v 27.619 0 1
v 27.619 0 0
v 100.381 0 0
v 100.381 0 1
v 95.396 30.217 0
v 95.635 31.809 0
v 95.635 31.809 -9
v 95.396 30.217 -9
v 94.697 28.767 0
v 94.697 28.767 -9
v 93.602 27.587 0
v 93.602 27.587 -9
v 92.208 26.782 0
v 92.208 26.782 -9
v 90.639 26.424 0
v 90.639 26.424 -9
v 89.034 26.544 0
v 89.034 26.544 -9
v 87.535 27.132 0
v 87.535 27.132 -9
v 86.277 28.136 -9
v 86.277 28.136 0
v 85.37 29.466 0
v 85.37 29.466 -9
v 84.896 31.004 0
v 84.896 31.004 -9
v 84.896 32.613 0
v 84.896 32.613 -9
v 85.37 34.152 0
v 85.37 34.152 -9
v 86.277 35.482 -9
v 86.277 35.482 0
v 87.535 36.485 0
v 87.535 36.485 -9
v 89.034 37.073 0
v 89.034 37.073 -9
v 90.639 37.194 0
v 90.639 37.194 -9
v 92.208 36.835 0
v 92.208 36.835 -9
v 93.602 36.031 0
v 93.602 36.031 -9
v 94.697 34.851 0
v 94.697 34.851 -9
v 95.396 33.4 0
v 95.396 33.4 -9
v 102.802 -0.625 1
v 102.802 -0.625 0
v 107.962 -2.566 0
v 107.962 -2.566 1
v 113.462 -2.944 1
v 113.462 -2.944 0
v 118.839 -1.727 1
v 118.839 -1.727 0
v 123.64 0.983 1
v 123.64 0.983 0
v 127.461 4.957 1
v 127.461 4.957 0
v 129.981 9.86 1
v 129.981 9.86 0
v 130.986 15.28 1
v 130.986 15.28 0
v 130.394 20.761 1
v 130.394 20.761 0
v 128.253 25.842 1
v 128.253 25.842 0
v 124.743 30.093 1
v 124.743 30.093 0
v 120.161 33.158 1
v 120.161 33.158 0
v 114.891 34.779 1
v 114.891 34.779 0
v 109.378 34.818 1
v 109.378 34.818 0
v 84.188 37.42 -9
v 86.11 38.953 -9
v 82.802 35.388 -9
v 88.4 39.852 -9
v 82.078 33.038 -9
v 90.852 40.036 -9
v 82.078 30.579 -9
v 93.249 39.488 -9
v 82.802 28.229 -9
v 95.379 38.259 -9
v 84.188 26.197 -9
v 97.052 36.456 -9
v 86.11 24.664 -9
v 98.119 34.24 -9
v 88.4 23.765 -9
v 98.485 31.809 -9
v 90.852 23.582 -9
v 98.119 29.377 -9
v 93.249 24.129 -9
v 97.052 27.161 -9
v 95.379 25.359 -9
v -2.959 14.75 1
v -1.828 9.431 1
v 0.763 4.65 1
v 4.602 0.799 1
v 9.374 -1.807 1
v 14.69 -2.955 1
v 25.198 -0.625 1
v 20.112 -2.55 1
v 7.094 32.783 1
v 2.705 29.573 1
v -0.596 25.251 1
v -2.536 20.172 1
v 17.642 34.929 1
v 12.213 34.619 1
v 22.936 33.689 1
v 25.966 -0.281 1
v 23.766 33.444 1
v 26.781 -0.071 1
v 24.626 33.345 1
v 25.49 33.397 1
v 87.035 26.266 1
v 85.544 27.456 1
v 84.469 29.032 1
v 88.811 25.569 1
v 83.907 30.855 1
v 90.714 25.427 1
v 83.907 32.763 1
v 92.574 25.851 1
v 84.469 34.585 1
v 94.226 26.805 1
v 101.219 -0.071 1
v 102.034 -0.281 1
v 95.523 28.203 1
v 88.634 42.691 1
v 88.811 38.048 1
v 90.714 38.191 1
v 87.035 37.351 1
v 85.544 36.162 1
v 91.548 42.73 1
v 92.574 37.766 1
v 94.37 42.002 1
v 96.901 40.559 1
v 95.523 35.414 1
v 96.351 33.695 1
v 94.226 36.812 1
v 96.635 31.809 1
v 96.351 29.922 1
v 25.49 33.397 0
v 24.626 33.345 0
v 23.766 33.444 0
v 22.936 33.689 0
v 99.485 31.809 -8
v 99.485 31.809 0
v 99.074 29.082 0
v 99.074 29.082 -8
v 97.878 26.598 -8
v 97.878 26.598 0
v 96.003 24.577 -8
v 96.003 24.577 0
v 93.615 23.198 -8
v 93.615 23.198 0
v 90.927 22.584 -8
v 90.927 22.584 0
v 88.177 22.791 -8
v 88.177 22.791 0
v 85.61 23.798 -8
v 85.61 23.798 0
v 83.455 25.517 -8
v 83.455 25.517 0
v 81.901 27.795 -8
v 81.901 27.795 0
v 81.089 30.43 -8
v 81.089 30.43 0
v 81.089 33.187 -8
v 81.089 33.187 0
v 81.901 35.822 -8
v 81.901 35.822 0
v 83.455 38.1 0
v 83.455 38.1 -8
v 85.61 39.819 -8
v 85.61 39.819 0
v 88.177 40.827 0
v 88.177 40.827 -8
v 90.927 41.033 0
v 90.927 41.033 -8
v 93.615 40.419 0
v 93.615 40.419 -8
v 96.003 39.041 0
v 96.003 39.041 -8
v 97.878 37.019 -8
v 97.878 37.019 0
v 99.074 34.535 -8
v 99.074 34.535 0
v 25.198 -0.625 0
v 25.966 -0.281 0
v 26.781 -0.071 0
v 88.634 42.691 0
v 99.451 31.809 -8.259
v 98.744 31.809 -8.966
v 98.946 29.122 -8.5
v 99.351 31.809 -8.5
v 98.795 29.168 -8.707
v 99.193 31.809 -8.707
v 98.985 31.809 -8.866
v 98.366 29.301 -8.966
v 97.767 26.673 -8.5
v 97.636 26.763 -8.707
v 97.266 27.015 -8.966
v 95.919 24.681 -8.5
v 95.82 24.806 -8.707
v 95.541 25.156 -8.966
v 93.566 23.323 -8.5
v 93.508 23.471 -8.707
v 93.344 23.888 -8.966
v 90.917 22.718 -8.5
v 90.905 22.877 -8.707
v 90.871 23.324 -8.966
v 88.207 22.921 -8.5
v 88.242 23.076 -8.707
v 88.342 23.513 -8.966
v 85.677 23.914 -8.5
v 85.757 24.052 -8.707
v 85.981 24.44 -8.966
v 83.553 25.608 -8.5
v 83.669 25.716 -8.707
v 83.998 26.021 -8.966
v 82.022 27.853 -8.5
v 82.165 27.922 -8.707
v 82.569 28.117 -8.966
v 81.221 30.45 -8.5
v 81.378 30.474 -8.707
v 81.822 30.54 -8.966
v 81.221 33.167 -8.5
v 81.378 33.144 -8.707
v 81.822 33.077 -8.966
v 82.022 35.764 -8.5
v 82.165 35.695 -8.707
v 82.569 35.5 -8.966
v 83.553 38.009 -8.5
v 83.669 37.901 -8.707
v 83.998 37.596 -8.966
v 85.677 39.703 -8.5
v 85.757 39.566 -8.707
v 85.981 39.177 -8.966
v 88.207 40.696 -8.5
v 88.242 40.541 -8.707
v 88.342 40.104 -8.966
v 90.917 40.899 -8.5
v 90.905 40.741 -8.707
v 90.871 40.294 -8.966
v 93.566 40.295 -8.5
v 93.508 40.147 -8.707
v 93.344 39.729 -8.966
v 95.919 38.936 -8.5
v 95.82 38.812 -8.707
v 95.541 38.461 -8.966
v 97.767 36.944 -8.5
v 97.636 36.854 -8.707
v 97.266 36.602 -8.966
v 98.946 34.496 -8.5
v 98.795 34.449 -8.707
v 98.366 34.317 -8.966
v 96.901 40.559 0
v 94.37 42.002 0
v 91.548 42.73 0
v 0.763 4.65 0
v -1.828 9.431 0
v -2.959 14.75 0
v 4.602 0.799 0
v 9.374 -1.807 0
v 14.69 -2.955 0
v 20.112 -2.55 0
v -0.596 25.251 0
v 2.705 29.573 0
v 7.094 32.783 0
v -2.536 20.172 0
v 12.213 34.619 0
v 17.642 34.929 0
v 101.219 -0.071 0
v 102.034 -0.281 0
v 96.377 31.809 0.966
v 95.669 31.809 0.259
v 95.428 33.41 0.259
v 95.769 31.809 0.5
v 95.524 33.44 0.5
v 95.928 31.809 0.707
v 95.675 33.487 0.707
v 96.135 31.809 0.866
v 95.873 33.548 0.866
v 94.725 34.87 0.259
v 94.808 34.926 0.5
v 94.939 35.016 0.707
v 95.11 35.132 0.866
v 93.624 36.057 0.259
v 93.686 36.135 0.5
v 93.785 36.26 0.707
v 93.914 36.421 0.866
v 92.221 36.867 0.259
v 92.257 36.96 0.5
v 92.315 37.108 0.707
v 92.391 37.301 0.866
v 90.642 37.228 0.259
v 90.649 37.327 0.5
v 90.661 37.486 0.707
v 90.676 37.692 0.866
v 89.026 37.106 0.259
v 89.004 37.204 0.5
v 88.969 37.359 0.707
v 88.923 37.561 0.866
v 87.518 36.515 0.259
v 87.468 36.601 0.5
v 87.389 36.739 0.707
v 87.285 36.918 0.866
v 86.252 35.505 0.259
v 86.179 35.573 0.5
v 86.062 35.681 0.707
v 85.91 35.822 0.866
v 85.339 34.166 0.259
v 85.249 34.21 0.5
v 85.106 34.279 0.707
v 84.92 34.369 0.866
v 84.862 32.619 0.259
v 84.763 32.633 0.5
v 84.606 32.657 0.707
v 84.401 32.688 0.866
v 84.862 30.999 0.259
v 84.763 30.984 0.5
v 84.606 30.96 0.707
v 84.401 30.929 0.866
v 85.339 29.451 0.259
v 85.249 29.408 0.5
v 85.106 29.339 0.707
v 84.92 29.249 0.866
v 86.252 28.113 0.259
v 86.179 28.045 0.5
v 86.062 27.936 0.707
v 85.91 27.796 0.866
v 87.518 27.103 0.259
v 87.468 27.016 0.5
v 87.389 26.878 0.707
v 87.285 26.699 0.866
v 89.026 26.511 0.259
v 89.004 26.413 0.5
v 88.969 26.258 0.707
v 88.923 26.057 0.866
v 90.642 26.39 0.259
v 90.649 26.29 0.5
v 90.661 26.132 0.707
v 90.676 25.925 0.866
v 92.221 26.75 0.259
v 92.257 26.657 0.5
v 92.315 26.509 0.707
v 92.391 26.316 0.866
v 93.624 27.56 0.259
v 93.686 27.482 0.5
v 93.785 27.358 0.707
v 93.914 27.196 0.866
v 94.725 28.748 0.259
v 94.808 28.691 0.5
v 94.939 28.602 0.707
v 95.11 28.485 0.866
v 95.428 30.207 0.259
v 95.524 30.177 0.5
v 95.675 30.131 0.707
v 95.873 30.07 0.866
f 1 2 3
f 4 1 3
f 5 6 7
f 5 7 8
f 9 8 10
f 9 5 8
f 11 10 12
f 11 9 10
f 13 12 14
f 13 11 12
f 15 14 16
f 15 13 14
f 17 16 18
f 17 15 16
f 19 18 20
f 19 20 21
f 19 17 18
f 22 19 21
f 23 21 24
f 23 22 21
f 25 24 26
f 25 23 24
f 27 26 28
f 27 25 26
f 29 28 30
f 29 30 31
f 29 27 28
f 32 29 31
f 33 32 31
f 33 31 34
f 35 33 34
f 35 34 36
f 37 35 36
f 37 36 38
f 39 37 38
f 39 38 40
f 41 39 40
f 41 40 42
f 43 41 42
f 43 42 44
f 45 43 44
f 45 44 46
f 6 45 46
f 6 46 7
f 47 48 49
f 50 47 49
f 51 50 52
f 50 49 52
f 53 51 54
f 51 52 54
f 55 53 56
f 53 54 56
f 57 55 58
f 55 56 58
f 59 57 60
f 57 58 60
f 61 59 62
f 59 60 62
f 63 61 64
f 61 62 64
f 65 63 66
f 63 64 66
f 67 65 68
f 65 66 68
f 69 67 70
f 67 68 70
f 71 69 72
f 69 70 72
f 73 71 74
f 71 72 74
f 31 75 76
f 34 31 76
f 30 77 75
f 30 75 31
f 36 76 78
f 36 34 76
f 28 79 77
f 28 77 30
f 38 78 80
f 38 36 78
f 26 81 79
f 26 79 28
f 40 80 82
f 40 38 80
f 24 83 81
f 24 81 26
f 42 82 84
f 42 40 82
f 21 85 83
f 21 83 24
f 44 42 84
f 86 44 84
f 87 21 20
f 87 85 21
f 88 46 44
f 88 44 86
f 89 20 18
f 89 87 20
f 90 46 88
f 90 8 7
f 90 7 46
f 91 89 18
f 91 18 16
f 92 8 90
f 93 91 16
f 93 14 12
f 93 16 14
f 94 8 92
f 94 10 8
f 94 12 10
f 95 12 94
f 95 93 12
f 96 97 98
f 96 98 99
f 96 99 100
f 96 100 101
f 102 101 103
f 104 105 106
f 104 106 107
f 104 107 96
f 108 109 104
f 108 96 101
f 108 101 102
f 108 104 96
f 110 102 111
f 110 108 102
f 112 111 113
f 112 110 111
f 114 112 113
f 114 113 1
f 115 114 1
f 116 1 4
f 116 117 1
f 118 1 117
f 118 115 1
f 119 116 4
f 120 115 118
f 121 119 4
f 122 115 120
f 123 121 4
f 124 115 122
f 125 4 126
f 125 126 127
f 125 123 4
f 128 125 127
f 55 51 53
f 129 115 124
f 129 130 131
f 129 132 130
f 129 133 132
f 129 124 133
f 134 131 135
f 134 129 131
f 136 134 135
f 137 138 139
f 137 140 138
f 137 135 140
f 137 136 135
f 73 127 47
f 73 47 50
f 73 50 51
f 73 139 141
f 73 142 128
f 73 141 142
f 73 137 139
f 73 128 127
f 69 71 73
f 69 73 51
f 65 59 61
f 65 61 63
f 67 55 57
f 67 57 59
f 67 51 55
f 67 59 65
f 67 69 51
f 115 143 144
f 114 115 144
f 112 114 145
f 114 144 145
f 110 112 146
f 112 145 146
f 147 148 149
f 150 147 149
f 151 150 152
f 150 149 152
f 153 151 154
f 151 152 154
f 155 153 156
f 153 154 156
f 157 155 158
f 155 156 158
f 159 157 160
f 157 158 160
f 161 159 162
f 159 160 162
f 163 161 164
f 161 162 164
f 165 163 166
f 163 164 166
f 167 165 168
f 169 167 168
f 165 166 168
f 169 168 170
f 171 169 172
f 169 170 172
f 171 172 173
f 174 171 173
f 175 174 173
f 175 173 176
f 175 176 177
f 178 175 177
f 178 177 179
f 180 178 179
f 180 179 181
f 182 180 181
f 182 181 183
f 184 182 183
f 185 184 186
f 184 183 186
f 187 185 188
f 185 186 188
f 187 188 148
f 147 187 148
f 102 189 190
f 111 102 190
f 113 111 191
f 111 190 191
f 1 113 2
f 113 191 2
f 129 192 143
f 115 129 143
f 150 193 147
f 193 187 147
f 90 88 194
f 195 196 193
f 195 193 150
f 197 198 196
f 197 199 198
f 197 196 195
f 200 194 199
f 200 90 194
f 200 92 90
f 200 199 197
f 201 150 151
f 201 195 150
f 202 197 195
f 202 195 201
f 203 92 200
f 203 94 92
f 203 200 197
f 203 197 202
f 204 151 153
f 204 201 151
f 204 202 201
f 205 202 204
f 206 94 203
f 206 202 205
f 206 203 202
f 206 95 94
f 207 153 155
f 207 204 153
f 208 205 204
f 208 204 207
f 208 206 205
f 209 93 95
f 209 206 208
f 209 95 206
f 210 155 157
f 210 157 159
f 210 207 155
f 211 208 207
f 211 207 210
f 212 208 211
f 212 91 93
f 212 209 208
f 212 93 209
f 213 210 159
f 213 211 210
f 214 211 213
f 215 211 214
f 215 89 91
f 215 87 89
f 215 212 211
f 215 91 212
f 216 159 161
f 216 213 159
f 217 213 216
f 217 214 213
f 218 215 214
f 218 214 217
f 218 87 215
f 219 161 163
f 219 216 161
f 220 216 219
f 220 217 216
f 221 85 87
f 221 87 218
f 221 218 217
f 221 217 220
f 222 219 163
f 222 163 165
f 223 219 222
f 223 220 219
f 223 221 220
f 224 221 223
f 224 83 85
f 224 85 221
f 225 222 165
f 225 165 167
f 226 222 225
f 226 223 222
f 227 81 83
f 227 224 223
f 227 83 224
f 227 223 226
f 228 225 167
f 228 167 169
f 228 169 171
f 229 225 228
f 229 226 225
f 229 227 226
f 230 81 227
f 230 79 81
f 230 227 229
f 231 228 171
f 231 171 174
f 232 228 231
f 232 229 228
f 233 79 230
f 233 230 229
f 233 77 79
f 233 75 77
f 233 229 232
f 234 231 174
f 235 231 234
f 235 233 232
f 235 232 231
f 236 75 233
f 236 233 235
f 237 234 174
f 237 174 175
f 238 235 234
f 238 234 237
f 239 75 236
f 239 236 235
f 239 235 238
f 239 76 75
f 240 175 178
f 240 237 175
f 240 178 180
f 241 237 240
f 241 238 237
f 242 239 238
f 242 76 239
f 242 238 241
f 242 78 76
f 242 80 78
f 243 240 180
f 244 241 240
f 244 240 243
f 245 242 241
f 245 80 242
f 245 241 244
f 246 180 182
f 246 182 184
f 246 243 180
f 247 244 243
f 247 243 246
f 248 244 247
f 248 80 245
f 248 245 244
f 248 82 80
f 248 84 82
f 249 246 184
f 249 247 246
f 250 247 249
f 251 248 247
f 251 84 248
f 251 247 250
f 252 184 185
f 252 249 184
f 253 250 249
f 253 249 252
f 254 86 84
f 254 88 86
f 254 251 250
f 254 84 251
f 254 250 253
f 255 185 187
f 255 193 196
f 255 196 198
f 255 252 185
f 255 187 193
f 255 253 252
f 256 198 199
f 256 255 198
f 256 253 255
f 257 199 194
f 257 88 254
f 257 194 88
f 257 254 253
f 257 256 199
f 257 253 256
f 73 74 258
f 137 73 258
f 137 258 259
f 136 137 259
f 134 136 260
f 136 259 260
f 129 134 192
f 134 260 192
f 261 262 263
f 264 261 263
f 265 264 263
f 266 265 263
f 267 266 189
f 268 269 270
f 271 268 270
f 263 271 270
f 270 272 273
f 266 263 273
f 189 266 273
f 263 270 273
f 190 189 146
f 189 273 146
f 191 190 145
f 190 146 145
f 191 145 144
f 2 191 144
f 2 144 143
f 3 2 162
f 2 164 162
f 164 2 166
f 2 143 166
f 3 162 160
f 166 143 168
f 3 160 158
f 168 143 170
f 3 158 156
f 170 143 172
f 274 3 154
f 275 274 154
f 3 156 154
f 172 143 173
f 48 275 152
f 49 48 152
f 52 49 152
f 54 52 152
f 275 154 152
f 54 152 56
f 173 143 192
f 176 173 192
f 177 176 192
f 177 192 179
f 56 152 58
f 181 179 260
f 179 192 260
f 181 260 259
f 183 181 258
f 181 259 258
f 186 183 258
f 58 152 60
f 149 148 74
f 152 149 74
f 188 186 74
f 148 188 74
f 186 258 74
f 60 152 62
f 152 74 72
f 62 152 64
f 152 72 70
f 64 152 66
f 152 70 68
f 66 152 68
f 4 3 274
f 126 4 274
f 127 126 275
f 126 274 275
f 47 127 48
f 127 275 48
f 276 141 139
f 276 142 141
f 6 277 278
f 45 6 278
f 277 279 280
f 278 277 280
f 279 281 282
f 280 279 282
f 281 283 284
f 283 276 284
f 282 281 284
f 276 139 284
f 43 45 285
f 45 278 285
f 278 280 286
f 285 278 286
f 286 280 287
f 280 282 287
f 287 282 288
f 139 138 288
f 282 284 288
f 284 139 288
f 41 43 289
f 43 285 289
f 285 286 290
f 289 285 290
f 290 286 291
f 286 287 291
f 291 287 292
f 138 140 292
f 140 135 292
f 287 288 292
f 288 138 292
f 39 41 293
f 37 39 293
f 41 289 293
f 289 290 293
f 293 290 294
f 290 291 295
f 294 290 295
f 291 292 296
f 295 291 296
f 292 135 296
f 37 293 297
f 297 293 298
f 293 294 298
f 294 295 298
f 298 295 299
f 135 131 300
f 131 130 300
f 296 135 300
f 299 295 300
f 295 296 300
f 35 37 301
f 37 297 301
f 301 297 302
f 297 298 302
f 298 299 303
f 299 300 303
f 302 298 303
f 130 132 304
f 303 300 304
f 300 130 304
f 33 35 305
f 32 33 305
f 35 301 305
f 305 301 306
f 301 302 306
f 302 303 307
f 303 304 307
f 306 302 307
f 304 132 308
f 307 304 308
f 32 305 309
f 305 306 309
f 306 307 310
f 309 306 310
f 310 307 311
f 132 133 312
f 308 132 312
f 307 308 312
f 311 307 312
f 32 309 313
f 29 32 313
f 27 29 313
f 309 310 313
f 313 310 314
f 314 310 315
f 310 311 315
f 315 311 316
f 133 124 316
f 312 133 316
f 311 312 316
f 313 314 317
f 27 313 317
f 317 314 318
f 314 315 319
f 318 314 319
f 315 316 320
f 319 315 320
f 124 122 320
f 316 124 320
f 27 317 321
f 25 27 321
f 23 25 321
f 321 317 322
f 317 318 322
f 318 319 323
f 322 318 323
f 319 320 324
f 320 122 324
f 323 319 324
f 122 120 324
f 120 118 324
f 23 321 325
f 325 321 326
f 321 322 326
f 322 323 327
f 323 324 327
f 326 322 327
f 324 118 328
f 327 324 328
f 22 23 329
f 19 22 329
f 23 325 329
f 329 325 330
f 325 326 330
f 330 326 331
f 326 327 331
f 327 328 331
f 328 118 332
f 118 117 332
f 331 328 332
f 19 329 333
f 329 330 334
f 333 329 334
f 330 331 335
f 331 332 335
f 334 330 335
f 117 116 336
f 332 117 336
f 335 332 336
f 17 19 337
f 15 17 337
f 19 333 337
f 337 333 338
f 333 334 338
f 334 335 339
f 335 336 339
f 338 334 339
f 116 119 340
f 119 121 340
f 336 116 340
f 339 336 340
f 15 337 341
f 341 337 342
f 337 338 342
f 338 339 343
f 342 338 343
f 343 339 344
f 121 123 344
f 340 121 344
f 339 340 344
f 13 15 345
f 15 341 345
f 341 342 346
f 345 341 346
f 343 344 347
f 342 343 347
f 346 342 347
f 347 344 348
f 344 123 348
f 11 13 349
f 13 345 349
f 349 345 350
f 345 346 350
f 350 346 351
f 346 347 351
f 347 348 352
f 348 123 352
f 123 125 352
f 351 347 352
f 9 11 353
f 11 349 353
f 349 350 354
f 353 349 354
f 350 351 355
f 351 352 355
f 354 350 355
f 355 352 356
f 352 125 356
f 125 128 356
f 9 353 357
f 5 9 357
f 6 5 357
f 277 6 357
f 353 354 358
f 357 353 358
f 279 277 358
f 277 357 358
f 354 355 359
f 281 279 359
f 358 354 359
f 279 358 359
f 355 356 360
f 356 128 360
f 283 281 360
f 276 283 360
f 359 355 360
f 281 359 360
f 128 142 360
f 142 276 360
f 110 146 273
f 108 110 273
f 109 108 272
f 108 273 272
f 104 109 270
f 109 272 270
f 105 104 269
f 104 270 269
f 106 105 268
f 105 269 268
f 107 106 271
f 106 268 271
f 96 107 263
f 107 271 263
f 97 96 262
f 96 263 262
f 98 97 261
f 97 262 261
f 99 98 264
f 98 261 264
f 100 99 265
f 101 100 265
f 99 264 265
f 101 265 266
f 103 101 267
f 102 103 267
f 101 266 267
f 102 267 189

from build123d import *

# Parameters (mm, degrees)
F0_R     = 5.4
F1_DEPTH = 1
F2_R     = 9.25
F2_R_2   = 5.4
F3_DEPTH = 9
F4_R     = 1


with BuildPart() as f1:
    # F0 (on Top) → F1 (new body)
    with BuildSketch(Plane.XY):
        with BuildLine():
            ThreePointArc((25.1983354472, -0.625), (26.3689500386, -0.1587708172), (27.6189500386, 0))
            Line((27.6189500386, 0), (100.3810499614, 0))
            ThreePointArc((100.3810499614, 0), (101.6310499614, -0.1587708172), (102.8016645528, -0.625))
            ThreePointArc((102.8016645528, -0.625), (130.6811062012, 12.5335506494), (109.3784879352, 34.8182803278))
            Line((109.3784879352, 34.8182803278), (96.9014291121, 40.5587357108))
            ThreePointArc((96.9014291121, 40.5587357108), (92.9828428426, 42.4600025358), (88.6335206854, 42.691369483))
            Line((88.6335206854, 42.691369483), (25.4897410073, 33.3968526715))
            ThreePointArc((25.4897410073, 33.3968526715), (24.1939378933, 33.3758798492), (22.936271789, 33.688644201))
            ThreePointArc((22.936271789, 33.688644201), (-2.9588483895, 14.7501729139), (25.1983354472, -0.625))
        make_face()
        with Locations((90.2354166667, 31.8086341069)):
            Circle(F0_R, mode=Mode.SUBTRACT)
    extrude(amount=F1_DEPTH)

    # F2 (on face) → F3 (join)
    with BuildSketch(Plane(origin=(0, 0, 0), x_dir=(1, 0, 0), z_dir=(0, 0, -1))):
        with Locations((90.2354166667, -31.8086341069)):
            Circle(F2_R)
        with Locations((90.2354166667, -31.8086341069)):
            Circle(F2_R_2, mode=Mode.SUBTRACT)
    extrude(amount=F3_DEPTH)

    # F4
    f4_edges = [f1.edges().sort_by_distance(p)[0] for p in [
        (80.985417, 31.808634, -9),
        (84.835417, 31.808634, 1),
    ]]
    fillet(f4_edges, radius=F4_R)


solid = f1.part
